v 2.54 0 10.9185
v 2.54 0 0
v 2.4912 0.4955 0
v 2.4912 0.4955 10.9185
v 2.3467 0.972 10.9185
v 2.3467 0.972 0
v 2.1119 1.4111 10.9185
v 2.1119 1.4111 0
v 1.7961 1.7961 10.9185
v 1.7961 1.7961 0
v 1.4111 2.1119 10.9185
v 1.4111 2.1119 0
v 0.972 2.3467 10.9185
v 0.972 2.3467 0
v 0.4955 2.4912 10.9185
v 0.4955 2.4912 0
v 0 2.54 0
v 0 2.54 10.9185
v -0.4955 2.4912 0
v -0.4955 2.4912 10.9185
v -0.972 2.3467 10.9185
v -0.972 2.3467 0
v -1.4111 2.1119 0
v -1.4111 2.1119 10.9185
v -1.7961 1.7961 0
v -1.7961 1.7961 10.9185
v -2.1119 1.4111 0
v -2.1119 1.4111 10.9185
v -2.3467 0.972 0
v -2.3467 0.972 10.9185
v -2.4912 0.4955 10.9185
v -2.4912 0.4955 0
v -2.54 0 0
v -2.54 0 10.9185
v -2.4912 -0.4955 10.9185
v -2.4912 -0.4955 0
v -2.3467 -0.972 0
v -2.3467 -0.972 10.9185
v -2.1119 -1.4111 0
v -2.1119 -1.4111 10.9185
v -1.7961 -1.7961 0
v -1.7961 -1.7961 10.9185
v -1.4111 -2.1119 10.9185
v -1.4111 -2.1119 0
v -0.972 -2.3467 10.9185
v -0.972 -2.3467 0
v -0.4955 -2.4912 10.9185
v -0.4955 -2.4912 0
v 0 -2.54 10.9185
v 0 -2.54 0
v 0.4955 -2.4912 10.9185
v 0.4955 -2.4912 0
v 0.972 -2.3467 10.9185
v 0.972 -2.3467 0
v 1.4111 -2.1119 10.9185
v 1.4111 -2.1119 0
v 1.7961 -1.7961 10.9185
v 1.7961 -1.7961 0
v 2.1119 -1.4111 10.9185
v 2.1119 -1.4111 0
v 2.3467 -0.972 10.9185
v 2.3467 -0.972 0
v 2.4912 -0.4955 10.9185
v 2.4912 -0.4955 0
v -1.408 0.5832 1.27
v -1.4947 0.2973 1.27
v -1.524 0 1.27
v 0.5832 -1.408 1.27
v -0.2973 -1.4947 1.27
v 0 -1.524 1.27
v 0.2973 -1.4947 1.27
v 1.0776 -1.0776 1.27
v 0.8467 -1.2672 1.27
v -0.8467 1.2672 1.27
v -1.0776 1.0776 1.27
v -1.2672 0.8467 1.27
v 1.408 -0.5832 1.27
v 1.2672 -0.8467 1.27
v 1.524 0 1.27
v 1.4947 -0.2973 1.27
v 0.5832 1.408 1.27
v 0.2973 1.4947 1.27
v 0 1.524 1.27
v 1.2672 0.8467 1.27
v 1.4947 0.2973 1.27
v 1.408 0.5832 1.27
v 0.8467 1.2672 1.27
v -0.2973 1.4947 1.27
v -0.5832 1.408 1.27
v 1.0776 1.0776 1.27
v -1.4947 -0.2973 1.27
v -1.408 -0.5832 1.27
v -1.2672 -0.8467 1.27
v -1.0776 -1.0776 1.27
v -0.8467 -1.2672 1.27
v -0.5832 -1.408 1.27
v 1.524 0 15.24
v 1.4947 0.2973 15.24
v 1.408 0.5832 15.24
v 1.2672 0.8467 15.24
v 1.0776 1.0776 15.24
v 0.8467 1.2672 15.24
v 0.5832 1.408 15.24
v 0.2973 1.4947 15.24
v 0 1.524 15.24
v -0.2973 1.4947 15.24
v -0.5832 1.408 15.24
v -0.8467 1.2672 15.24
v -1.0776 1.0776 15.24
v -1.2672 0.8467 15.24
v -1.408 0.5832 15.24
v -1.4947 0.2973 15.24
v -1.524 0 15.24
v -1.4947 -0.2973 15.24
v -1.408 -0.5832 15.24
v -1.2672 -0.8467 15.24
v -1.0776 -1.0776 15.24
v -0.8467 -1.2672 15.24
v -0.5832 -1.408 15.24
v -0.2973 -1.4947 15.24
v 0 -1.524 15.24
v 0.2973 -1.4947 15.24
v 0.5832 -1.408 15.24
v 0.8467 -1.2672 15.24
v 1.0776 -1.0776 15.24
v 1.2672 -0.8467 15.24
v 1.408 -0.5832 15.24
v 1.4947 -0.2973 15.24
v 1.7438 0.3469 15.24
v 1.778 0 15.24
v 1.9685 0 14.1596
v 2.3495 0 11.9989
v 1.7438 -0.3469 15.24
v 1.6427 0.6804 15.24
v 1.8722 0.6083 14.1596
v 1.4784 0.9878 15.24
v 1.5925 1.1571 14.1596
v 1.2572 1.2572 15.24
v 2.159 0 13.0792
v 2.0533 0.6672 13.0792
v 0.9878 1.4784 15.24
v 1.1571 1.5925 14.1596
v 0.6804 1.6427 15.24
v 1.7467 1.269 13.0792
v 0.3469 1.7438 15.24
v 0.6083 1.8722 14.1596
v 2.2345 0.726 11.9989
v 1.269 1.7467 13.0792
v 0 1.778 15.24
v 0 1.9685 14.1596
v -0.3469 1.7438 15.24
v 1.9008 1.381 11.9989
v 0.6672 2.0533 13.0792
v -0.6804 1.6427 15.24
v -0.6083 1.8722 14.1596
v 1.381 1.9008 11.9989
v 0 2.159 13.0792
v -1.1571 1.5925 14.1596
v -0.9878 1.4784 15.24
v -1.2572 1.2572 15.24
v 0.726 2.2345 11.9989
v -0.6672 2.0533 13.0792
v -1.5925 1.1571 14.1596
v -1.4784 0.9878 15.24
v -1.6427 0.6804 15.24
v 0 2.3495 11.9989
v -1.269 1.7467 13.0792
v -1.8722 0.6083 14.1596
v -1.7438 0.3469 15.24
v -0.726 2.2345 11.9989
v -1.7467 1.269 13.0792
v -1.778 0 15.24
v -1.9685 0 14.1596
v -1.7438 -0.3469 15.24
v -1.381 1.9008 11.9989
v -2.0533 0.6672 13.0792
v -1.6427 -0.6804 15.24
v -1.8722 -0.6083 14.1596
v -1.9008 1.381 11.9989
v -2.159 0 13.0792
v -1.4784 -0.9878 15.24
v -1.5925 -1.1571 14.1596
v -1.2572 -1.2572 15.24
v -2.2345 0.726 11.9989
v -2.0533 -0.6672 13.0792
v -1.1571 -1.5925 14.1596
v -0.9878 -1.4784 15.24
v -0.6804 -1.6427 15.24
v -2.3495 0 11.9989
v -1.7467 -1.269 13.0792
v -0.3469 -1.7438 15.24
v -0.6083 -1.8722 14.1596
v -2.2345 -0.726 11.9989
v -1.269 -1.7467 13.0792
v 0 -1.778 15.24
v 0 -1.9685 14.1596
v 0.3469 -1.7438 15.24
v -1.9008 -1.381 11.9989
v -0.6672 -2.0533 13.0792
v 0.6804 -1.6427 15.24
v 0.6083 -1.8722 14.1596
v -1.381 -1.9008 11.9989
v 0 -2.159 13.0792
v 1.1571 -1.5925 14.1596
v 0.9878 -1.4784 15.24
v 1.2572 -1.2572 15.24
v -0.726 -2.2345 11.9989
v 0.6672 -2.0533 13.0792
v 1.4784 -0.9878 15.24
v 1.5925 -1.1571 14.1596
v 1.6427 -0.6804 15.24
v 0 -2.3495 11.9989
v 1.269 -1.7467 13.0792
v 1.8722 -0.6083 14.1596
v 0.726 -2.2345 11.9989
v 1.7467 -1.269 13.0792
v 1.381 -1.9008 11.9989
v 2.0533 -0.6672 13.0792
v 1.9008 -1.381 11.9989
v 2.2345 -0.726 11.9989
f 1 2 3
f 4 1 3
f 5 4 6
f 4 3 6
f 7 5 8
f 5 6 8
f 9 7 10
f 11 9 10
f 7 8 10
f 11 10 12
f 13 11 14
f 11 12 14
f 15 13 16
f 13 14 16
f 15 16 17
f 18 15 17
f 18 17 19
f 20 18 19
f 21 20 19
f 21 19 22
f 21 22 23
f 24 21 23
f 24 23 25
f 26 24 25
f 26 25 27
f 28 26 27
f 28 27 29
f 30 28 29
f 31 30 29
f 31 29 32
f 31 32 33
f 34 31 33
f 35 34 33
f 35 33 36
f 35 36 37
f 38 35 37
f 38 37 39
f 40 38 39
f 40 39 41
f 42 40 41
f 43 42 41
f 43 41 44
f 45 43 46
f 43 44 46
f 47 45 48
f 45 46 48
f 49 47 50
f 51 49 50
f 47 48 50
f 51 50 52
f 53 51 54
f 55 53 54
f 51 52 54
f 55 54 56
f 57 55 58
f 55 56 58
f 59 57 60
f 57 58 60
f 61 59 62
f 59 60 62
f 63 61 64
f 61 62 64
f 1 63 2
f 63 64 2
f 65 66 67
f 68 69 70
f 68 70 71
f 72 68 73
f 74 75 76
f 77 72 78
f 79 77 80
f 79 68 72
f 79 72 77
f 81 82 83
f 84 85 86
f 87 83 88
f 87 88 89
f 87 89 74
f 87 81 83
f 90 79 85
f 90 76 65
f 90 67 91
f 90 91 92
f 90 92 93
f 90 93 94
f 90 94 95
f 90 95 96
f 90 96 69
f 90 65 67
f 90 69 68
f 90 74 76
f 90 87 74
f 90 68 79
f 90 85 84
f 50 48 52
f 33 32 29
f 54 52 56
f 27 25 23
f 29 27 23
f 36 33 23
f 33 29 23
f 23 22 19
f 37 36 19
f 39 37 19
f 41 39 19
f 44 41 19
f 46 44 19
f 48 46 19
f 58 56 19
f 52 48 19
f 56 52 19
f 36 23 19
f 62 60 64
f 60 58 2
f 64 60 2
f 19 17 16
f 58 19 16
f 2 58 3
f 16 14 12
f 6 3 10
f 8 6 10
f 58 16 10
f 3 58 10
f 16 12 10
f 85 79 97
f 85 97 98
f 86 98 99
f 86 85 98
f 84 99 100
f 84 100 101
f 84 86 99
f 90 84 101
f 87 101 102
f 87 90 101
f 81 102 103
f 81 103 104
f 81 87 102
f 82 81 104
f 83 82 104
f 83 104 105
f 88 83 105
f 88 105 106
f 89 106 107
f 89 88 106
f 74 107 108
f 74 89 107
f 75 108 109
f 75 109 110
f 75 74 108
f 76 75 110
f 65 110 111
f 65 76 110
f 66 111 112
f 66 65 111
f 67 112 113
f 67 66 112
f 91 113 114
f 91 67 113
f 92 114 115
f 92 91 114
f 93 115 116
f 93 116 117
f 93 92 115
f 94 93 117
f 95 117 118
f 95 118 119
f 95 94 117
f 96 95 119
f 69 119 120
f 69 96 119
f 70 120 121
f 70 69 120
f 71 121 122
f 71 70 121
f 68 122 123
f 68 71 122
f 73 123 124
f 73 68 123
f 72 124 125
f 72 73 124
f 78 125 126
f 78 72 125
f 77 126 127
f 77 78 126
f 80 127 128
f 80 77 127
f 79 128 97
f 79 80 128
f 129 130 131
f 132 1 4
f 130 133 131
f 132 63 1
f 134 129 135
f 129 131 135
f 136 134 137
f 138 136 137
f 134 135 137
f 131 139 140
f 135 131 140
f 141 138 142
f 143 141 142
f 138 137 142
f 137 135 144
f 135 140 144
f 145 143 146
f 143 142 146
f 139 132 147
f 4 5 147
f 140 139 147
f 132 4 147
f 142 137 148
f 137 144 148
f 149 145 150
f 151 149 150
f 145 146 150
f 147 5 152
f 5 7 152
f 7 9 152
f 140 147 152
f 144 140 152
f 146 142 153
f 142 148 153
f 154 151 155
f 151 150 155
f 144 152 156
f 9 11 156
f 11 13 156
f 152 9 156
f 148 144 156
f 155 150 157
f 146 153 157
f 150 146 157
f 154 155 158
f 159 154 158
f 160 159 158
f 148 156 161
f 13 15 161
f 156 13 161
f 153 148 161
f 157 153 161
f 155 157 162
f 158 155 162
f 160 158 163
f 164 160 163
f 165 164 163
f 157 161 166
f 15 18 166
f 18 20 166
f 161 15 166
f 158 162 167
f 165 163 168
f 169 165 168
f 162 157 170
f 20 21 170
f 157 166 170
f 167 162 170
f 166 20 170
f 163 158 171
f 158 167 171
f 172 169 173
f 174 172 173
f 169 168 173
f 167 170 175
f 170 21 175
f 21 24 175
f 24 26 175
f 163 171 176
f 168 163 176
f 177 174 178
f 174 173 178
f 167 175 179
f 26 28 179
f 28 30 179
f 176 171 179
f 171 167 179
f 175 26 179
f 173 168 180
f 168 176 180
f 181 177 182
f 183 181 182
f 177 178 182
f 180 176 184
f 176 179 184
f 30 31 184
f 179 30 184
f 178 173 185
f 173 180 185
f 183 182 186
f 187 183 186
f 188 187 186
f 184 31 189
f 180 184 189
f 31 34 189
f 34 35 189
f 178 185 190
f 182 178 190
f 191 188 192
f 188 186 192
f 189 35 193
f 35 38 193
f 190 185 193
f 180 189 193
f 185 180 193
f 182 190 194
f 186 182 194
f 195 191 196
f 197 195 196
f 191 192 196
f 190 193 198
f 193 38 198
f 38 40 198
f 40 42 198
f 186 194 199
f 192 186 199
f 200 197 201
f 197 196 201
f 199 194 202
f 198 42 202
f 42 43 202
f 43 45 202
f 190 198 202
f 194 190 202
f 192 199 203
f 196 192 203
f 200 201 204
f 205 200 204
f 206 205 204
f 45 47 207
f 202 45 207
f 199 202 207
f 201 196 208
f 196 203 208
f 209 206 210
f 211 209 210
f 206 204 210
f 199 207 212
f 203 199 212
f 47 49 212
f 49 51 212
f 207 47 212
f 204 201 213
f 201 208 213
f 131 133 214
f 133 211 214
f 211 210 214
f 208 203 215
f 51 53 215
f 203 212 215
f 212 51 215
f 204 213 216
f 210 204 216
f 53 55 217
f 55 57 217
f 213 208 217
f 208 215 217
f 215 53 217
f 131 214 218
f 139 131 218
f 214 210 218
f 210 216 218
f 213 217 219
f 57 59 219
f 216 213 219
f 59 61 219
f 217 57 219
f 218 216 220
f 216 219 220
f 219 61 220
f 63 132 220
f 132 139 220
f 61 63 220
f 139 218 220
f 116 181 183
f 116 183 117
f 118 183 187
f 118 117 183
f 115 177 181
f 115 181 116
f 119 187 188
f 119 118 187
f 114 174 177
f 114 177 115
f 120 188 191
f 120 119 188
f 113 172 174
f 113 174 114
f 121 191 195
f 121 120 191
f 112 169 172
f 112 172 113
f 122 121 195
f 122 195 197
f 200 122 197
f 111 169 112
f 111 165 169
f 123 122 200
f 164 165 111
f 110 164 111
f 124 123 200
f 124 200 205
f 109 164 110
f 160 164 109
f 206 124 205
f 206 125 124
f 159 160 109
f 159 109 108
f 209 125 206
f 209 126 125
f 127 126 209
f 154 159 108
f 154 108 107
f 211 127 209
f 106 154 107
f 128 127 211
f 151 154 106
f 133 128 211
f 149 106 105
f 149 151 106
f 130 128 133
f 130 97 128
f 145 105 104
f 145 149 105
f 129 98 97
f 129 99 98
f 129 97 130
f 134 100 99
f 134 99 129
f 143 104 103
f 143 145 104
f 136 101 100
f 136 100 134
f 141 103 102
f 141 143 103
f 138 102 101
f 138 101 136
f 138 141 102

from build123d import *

# Parameters (mm, degrees)
F0_R     = 2.54
F1_DEPTH = 1.27
F2_R     = 2.54
F2_R_2   = 1.524
F3_DEPTH = 13.97
F4_SIZE2 = 4.3215167465
F4_SIZE  = 0.762


with BuildPart() as f1:
    # F0 (on Top) → F1 (new body)
    with BuildSketch(Plane.XY):
        Circle(F0_R)
    extrude(amount=F1_DEPTH)

    # F2 (on face) → F3 (join)
    with BuildSketch(Plane.XY.offset(1.27)):
        Circle(F2_R)
        Circle(F2_R_2, mode=Mode.SUBTRACT)
    extrude(amount=F3_DEPTH)

    # F4
    f4_edges = [f1.edges().sort_by_distance(p)[0] for p in [
        (-2.54, 0, 15.24),
    ]]
    f4_side = f1.faces().sort_by_distance((-2.468158, 0, 15.24))[0]
    chamfer(f4_edges, length=F4_SIZE, length2=F4_SIZE2, reference=f4_side)


solid = f1.part
